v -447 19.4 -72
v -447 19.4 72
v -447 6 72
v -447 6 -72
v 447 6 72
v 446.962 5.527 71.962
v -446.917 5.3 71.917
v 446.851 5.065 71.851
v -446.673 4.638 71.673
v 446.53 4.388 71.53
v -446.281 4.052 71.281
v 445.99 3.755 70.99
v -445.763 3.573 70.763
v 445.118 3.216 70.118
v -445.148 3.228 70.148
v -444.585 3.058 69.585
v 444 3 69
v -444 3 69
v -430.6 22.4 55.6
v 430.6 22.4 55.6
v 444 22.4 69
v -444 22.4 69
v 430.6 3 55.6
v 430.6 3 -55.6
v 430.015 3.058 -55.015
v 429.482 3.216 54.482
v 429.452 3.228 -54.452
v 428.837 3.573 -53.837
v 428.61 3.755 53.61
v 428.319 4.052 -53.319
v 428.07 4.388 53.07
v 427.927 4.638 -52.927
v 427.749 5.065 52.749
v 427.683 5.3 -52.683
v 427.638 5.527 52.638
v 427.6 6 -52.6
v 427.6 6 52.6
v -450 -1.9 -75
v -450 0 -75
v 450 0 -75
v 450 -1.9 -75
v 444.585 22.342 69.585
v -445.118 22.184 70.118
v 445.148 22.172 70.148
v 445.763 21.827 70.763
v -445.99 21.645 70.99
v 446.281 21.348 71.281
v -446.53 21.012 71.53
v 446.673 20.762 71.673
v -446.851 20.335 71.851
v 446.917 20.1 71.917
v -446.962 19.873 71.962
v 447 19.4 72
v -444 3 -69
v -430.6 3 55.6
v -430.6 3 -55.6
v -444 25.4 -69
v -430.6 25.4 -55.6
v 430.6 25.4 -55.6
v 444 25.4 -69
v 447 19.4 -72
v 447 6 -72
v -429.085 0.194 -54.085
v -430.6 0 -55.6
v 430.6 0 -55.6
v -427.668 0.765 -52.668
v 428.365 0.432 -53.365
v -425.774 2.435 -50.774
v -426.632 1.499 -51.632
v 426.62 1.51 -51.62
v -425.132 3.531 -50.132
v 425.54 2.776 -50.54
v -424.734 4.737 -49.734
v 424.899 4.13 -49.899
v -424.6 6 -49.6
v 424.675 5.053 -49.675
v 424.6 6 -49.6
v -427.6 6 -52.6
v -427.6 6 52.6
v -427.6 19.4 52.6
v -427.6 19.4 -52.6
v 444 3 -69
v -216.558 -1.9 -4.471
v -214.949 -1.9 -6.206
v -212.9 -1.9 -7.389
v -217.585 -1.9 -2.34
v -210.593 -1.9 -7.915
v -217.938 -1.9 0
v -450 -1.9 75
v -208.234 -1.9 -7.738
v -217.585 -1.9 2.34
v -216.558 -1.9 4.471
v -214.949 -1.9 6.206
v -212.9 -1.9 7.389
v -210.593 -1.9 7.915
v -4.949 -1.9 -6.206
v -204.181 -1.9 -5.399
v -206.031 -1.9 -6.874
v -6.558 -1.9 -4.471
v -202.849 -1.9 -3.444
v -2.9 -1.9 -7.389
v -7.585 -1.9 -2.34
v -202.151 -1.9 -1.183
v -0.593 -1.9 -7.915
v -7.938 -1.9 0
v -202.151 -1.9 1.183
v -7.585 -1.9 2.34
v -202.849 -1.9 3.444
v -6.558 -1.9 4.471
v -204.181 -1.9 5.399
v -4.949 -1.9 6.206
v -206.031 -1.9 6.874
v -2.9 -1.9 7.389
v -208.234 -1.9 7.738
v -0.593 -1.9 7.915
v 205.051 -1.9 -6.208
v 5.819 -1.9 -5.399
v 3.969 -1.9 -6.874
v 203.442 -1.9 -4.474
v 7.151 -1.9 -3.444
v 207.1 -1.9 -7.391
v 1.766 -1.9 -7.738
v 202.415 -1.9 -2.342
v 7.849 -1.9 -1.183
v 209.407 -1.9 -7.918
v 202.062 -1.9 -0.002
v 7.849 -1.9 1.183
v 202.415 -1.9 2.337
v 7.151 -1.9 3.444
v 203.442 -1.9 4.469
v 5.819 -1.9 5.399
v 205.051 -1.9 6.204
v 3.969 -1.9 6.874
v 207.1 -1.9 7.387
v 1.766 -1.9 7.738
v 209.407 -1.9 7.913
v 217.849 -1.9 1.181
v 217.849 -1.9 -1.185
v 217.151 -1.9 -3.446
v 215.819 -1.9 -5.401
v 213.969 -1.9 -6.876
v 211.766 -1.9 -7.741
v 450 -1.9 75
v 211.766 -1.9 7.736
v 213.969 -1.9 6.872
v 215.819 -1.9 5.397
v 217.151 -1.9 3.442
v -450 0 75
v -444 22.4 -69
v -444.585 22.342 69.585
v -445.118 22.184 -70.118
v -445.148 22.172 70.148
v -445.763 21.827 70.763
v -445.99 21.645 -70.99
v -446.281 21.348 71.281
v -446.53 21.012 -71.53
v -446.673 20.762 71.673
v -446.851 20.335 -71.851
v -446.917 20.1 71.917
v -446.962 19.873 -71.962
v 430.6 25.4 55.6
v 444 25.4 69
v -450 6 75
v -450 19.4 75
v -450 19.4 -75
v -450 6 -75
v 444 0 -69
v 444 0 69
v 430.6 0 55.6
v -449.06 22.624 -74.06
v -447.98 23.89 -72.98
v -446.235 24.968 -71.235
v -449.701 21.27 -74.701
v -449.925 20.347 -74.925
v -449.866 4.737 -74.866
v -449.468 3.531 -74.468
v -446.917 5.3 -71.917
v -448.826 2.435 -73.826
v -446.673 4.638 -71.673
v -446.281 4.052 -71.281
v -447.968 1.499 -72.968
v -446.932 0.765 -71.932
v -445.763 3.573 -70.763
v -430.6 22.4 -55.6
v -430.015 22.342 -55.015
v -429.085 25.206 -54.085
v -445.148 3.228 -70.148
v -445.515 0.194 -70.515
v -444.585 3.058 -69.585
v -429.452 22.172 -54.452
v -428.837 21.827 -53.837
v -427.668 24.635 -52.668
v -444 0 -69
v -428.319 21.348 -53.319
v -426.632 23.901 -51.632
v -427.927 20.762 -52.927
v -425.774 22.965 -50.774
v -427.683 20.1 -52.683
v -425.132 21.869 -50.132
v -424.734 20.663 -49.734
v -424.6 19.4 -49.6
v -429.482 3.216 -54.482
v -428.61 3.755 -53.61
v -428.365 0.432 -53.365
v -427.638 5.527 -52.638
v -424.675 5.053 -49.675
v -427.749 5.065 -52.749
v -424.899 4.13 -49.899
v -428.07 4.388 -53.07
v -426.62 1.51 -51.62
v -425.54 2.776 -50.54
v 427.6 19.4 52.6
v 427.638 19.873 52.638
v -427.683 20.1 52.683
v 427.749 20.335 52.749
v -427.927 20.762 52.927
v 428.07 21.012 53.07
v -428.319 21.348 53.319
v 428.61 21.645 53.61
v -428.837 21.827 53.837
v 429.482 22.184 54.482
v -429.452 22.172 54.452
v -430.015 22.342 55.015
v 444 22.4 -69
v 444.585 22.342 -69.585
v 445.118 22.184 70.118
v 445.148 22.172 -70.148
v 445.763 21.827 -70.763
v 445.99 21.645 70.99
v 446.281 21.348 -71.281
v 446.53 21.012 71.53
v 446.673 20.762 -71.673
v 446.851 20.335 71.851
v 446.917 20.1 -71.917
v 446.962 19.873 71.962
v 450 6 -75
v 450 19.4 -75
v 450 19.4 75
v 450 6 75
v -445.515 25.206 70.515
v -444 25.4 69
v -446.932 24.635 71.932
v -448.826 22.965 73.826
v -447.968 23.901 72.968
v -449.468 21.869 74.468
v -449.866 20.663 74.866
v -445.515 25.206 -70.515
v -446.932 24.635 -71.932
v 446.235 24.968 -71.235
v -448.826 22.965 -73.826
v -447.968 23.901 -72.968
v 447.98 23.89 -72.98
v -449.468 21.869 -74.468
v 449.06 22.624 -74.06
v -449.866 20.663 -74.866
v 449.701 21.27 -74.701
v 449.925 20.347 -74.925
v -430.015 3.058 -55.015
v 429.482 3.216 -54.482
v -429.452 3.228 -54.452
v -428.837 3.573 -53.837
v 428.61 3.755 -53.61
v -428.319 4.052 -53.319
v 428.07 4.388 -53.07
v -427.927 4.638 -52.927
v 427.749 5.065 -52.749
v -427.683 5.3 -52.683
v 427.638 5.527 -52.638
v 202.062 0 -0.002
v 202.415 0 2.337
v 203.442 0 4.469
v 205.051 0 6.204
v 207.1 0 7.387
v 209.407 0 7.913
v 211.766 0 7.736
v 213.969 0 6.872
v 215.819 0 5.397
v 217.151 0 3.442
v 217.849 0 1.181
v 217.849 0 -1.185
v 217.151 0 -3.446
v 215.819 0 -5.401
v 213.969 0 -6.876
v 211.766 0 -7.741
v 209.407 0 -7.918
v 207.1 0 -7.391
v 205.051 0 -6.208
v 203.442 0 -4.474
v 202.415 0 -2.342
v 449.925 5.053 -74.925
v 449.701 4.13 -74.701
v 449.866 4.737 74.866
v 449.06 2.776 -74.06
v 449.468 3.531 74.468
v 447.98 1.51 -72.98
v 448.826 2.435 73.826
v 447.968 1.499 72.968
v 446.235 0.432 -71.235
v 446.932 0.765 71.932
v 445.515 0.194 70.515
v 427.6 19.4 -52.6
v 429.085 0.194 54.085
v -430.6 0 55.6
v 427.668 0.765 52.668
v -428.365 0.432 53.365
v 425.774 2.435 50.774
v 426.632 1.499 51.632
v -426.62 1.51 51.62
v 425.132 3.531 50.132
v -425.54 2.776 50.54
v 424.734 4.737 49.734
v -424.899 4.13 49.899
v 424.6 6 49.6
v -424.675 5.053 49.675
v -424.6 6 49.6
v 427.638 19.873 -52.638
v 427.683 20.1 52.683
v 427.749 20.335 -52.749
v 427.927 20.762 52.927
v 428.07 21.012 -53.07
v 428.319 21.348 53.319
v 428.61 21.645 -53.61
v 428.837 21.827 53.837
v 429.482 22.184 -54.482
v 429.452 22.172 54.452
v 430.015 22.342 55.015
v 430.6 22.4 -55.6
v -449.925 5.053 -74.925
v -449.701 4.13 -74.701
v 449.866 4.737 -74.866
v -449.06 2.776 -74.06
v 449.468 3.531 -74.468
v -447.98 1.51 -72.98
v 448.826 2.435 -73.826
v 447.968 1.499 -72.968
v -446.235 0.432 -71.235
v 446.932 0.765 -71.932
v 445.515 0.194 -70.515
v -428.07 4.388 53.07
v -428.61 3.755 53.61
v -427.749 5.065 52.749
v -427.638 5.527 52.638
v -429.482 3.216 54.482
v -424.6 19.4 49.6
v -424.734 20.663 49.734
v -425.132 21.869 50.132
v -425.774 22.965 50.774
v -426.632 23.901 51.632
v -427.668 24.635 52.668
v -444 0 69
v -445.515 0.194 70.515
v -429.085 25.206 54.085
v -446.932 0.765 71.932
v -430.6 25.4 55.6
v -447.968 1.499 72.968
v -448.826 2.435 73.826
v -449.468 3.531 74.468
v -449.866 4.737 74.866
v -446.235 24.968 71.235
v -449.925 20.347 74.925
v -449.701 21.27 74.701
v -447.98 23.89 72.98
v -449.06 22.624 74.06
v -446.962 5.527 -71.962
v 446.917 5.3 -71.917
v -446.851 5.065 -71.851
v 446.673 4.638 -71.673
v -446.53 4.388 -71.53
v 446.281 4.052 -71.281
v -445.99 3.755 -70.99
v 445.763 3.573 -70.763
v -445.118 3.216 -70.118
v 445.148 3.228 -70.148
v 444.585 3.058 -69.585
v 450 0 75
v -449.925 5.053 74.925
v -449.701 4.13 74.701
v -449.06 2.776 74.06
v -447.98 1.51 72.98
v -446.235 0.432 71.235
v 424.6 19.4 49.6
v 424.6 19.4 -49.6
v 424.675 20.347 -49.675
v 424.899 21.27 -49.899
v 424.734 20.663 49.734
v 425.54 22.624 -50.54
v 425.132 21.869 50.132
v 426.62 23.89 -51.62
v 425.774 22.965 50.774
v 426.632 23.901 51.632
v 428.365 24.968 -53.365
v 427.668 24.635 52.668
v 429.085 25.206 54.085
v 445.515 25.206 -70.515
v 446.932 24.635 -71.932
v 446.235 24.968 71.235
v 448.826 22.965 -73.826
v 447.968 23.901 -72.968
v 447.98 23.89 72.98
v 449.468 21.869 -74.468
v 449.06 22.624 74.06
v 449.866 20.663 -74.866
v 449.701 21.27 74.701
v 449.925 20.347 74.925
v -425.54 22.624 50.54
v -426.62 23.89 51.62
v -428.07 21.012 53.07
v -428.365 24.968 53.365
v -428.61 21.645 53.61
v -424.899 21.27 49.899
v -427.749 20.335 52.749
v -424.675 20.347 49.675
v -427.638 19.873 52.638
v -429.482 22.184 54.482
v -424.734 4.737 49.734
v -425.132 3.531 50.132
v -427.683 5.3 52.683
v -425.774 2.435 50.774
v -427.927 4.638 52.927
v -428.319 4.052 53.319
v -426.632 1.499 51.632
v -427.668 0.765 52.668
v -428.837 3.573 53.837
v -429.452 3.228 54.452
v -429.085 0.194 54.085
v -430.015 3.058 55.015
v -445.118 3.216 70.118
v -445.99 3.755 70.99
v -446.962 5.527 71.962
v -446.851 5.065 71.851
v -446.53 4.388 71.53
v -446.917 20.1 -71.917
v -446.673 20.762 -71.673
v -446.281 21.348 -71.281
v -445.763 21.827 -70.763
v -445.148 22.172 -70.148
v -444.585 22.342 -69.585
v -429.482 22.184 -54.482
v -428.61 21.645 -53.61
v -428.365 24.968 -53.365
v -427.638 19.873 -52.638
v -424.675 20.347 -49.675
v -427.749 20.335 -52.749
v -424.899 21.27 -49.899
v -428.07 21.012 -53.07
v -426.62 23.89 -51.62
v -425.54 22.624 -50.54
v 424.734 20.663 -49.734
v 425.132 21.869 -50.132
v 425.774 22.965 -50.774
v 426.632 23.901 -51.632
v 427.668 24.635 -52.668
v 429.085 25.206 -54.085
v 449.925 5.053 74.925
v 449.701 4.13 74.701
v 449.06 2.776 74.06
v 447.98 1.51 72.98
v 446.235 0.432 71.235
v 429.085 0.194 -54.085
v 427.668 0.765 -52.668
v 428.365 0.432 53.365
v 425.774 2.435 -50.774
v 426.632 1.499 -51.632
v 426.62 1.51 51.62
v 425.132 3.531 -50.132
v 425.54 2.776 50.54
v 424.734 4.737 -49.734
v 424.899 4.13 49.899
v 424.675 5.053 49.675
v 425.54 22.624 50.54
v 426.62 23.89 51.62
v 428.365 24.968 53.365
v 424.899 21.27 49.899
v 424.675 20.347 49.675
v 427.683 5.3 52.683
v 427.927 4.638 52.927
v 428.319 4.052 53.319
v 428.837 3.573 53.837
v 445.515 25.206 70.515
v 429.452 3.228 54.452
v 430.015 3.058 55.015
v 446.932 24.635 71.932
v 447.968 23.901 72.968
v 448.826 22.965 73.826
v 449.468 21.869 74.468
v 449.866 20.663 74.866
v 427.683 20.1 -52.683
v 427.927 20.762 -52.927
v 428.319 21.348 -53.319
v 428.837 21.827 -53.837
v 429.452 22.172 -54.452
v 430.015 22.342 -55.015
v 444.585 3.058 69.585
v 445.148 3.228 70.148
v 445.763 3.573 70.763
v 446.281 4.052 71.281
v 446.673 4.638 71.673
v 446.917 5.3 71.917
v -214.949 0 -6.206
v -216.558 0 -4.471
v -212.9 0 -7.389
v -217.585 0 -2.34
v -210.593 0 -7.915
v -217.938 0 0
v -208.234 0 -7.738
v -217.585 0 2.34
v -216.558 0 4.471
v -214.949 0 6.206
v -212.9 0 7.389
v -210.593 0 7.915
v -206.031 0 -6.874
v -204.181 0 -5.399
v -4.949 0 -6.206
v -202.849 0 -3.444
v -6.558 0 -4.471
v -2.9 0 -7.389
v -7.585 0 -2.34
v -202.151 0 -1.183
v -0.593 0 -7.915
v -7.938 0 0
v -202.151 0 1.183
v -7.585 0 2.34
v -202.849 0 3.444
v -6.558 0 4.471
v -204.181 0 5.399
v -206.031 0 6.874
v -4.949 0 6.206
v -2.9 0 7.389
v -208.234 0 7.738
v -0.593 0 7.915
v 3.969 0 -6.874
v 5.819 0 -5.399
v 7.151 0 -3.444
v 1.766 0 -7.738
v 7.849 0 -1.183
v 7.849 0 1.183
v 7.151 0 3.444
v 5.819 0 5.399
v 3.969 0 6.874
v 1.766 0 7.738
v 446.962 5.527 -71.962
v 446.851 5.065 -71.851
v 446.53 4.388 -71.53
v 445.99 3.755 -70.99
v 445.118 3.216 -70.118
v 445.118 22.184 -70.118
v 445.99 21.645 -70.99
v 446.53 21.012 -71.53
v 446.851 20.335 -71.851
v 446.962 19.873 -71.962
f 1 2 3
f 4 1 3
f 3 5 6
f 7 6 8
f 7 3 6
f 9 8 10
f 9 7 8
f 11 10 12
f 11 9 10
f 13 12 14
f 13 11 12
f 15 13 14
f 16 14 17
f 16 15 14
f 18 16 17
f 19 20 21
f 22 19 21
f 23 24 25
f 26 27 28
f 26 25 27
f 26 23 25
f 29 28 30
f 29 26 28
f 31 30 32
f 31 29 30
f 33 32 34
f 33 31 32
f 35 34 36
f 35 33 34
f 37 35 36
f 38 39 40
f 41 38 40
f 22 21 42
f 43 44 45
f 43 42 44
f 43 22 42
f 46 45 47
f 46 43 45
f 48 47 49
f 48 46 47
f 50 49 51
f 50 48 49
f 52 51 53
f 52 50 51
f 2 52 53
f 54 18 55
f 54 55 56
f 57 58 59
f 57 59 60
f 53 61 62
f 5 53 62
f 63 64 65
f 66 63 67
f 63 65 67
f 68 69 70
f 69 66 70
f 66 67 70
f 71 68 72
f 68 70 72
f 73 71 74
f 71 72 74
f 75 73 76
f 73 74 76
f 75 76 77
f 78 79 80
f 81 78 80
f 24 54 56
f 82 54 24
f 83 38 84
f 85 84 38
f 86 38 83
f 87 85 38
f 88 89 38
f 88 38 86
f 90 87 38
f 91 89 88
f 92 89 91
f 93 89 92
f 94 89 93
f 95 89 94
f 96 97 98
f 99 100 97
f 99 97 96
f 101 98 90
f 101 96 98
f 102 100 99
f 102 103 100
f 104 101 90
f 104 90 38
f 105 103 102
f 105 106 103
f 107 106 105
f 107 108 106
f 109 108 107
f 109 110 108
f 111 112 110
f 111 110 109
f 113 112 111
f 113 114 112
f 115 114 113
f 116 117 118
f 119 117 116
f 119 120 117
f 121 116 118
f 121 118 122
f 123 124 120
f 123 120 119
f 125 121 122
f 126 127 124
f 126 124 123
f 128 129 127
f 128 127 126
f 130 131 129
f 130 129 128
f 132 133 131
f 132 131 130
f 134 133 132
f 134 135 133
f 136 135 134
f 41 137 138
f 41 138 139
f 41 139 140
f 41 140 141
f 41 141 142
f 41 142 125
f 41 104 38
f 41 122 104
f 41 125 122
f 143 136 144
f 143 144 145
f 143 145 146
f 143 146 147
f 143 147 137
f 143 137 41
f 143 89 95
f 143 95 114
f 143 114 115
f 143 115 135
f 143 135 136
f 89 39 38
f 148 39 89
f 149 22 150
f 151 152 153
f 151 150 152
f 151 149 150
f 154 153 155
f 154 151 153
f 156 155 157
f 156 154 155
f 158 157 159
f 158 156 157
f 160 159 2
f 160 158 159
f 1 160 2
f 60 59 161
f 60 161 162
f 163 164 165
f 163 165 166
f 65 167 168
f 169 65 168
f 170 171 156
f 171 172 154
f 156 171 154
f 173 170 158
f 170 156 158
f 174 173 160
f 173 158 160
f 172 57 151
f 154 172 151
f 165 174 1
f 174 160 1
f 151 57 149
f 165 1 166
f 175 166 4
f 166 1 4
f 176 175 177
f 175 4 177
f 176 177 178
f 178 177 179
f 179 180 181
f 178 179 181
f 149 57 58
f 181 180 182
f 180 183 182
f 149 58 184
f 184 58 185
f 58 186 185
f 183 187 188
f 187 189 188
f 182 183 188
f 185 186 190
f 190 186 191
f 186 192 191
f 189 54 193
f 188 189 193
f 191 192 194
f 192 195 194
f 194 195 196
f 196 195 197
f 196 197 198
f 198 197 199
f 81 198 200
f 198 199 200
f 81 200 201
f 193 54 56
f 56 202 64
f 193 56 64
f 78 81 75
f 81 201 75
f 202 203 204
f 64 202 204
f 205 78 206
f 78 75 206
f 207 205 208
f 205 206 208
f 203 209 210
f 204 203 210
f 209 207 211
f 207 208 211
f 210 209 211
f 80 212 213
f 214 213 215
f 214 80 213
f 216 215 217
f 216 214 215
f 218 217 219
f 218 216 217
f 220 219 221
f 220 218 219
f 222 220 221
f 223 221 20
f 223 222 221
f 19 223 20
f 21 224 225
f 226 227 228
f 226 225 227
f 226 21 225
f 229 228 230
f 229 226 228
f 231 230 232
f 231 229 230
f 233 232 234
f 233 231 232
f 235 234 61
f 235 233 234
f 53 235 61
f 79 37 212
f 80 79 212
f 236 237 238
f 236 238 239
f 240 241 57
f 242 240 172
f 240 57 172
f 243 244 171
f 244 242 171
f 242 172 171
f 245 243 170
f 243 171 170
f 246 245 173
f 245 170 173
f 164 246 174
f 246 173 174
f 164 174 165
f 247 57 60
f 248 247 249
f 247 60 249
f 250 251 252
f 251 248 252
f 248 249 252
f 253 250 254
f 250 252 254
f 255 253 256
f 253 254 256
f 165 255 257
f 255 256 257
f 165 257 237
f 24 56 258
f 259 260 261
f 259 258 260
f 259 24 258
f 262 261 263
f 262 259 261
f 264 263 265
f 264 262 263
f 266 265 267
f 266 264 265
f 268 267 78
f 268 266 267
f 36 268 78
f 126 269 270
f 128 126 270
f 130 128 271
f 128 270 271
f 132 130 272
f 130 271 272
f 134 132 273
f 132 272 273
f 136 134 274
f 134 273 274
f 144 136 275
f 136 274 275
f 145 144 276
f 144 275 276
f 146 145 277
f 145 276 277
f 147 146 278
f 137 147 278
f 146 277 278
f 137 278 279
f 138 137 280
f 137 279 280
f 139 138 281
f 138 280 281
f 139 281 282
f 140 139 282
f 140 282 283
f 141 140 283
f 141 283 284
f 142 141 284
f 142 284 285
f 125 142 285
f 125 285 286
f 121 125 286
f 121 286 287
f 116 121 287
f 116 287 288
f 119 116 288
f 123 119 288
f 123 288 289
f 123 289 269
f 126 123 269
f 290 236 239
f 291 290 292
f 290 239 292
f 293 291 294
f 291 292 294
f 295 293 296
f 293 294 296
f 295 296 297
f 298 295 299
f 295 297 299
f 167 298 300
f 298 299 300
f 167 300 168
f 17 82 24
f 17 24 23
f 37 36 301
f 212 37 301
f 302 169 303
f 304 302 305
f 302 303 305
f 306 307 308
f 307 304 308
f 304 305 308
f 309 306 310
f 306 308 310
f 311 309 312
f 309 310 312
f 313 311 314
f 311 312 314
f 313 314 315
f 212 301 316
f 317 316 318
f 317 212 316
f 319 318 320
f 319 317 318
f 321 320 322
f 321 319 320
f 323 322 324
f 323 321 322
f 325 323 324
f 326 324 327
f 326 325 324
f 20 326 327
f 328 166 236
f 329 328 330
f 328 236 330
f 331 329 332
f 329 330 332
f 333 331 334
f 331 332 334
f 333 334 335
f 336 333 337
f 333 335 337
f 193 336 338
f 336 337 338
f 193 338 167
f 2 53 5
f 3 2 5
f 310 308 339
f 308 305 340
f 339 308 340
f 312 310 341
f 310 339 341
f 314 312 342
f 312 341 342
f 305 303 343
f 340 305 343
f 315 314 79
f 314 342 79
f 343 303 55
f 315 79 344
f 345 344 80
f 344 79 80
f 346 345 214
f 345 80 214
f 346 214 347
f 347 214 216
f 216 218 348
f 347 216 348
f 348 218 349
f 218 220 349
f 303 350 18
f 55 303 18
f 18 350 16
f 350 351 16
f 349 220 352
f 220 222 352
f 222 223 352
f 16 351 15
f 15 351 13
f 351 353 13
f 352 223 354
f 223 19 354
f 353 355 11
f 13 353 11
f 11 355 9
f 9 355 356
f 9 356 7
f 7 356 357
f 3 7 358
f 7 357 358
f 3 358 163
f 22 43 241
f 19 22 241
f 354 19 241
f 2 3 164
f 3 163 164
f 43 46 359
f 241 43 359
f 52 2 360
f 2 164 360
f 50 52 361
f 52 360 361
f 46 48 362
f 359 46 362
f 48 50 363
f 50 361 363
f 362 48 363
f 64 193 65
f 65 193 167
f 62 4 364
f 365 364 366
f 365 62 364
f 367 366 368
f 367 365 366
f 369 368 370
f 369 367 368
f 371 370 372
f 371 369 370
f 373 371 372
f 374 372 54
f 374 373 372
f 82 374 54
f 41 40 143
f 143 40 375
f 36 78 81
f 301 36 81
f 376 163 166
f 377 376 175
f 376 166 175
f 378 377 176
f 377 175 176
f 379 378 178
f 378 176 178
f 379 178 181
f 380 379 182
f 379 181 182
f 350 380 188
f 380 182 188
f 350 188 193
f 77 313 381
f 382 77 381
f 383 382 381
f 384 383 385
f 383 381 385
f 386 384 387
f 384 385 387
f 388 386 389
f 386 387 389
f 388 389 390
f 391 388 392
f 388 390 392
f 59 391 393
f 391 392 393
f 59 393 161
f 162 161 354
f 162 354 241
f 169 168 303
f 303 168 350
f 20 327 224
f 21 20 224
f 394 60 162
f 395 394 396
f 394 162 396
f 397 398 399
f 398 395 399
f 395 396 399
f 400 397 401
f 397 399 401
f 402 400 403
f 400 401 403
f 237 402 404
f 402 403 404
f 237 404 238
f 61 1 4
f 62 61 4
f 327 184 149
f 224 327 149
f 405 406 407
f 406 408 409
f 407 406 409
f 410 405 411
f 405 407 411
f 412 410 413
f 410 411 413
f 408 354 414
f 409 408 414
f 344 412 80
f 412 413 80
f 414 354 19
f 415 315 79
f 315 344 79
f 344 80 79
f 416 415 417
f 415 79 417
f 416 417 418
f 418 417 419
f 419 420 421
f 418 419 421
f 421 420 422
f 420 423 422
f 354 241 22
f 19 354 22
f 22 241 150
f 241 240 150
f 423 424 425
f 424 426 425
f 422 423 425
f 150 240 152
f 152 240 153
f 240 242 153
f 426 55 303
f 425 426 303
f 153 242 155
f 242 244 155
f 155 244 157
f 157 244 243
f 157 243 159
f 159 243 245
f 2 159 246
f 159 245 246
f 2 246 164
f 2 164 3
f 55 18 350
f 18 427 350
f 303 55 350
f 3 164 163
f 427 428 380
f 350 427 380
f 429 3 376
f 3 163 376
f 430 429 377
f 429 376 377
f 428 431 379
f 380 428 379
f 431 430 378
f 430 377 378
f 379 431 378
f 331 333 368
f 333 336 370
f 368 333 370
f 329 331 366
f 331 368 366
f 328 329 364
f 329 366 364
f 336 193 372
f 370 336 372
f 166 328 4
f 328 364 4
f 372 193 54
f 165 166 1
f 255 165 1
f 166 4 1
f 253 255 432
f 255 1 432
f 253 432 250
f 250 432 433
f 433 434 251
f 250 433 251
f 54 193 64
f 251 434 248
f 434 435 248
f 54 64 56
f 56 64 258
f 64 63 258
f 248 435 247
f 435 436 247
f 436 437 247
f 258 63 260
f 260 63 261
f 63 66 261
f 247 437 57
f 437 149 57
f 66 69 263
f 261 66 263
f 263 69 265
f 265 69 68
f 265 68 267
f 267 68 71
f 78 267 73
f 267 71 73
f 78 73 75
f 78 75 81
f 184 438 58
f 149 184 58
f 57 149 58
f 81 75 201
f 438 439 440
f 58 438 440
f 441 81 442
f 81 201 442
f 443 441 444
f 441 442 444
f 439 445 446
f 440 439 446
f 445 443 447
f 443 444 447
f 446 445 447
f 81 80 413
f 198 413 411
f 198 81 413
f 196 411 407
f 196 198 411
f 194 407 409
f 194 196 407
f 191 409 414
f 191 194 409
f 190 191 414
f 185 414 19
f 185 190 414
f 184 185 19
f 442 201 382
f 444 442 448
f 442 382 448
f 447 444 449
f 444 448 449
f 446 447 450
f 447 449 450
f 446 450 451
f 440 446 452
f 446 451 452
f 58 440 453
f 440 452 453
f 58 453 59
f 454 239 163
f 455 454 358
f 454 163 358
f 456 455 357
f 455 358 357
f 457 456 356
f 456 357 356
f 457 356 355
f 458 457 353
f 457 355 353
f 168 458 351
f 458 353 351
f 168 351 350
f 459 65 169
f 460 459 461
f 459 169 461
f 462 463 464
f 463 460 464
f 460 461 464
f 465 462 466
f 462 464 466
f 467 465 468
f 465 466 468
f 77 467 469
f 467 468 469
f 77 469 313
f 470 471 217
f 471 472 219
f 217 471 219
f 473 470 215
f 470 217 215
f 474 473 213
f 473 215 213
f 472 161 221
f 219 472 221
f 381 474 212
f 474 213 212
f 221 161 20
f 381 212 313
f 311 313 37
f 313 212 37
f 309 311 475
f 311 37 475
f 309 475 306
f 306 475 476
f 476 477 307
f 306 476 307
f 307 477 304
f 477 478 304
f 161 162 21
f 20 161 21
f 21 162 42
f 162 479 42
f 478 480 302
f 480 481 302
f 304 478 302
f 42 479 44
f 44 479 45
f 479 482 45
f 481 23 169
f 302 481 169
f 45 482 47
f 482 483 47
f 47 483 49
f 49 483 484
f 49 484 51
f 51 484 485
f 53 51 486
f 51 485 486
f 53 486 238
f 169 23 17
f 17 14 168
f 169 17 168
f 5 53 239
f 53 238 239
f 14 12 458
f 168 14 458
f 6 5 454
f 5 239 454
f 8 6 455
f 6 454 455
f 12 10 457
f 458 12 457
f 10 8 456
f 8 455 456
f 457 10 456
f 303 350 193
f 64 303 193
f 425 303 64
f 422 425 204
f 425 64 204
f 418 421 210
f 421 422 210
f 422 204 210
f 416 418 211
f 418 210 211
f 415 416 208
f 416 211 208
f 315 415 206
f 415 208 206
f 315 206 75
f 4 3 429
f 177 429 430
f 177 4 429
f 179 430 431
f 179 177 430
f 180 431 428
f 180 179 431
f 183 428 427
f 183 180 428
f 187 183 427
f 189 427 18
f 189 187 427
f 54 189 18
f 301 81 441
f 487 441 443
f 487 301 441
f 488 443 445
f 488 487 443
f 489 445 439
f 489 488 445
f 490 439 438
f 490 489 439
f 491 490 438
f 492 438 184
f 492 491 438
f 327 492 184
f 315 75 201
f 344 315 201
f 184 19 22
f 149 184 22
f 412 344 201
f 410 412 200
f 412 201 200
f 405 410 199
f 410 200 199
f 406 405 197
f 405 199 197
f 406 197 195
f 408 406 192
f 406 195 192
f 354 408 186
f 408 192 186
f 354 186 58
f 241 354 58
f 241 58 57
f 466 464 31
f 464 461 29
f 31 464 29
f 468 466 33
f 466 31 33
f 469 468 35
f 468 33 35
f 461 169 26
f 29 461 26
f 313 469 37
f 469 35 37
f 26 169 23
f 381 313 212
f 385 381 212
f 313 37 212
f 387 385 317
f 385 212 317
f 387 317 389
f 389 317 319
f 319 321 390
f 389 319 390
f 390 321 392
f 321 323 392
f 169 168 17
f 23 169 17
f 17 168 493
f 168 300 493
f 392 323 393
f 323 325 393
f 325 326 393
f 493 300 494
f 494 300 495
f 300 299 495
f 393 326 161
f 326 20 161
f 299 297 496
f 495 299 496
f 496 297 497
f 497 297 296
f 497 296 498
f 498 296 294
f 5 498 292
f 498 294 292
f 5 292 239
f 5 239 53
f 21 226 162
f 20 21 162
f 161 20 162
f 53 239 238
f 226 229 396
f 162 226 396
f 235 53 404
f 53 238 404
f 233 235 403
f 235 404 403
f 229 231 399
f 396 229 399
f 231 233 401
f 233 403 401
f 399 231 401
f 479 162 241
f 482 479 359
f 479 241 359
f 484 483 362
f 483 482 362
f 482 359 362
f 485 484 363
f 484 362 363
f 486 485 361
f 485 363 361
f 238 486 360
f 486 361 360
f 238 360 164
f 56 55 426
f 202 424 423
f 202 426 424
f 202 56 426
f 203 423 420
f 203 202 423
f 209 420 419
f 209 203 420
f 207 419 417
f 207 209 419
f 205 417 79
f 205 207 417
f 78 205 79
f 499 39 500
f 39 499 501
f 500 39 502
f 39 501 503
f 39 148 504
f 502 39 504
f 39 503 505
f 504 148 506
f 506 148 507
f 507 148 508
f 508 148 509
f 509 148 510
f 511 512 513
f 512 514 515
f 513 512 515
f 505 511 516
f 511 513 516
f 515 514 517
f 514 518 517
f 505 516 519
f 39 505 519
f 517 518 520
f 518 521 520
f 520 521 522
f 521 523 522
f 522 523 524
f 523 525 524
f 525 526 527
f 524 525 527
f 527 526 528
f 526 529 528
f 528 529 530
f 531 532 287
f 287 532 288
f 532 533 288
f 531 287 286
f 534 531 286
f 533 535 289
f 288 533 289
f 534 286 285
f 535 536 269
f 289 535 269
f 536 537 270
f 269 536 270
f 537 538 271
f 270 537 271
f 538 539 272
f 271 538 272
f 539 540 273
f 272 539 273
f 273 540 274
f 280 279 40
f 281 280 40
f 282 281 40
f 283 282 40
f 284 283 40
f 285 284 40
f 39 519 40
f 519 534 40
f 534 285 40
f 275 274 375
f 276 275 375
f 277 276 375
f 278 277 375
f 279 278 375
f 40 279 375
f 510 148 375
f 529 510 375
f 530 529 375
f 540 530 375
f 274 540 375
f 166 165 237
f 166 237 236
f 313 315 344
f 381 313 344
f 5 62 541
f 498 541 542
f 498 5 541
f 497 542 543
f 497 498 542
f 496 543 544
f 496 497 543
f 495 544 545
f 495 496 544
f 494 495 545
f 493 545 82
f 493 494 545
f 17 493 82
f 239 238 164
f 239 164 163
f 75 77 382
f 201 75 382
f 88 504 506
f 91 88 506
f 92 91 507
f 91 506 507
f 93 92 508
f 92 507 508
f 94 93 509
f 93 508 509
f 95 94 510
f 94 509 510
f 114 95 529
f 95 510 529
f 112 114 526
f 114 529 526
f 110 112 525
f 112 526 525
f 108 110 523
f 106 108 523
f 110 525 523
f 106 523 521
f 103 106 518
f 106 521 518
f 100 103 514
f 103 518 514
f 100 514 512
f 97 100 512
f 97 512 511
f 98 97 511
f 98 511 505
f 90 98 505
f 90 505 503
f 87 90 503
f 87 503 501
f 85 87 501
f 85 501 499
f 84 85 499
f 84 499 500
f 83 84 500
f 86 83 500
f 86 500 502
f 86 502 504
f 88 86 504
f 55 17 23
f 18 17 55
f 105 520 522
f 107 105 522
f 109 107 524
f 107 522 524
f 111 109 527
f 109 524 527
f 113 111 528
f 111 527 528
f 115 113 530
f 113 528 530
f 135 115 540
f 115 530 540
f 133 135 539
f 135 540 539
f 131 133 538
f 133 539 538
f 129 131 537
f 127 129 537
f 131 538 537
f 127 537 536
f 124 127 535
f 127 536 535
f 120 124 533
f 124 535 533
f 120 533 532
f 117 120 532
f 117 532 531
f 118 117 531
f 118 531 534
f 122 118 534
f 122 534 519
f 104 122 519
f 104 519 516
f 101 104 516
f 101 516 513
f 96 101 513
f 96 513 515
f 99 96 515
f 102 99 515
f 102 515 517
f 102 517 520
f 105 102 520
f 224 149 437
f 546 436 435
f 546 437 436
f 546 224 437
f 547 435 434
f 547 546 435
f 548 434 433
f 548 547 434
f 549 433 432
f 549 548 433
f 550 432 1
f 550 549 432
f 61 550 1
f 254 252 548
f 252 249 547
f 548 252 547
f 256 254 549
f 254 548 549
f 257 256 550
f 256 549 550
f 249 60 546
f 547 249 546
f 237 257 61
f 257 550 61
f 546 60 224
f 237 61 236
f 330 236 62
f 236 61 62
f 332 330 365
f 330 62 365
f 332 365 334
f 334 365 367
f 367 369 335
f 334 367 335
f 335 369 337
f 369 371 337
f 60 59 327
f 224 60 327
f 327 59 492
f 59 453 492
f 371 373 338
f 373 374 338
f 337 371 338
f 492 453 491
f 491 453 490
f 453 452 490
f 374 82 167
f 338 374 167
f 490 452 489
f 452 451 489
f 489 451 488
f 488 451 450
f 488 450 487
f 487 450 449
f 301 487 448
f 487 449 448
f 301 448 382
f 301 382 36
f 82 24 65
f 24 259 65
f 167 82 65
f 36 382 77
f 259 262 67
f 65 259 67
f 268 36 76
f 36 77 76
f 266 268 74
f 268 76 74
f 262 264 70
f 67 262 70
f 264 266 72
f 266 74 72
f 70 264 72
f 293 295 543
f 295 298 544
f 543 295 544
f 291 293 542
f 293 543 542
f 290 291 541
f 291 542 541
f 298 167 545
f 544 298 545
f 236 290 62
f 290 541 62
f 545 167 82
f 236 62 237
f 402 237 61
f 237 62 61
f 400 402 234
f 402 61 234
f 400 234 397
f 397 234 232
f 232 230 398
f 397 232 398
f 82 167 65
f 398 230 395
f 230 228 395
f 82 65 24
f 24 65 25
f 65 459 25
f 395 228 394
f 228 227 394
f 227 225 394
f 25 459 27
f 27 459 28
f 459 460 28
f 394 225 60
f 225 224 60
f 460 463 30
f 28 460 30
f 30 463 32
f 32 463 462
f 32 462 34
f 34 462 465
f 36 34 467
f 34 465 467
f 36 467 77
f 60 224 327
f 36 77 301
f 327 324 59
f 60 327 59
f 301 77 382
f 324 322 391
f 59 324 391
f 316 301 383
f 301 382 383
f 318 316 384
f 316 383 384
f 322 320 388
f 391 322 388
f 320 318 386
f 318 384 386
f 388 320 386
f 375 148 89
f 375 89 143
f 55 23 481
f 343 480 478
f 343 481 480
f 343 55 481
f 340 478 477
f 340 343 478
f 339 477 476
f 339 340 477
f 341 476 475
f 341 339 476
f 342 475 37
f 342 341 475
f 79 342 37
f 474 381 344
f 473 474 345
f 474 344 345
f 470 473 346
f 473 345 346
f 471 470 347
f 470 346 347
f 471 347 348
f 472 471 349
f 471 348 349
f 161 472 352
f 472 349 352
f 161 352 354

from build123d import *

# Parameters (mm, degrees)
TUBO_CUADRADO_2_X_2_X_0_25_1_DEPTH      = 186.921024484
TUBO_CUADRADO_2_X_2_X_0_25_1_DEPTH_BACK = 36.921024484
TUBO_CUADRADO_2_X_2_X_0_25_1_2_DEPTH    = 973.842048969
TUBO_CUADRADO_2_X_2_X_0_25_1_3_DEPTH    = 223.842048969
TUBO_CUADRADO_2_X_2_X_0_25_1_4_DEPTH    = 973.842048969
CROQUIS3_W                              = 900
CROQUIS3_H                              = 150
SALIENTE_EXTRUIR1_DEPTH                 = 1.9
CROQUIS4_R                              = 7.937500001
CORTAR_EXTRUIR1_DEPTH                   = 10


with BuildPart() as part:
    # Sketch1 → Tubo cuadrado 2 X 2 X 0.25(1) (new, two sides: drawn at the far end of the back side and taken through both)
    with BuildSketch(Plane(origin=(-437.3, 12.7, -75), x_dir=(1, 0, 0), z_dir=(0, 0, 1)).offset(-TUBO_CUADRADO_2_X_2_X_0_25_1_DEPTH_BACK)):
        with BuildLine():
            Line((-6.7, -12.7), (6.7, -12.7))
            ThreePointArc((6.7, -12.7), (10.942640687, -10.942640687), (12.7, -6.7))
            Line((12.7, -6.7), (12.7, 6.7))
            ThreePointArc((12.7, 6.7), (10.942640687, 10.942640687), (6.7, 12.7))
            Line((6.7, 12.7), (-6.7, 12.7))
            ThreePointArc((-6.7, 12.7), (-10.942640687, 10.942640687), (-12.7, 6.7))
            Line((-12.7, 6.7), (-12.7, -6.7))
            ThreePointArc((-12.7, -6.7), (-10.942640687, -10.942640687), (-6.7, -12.7))
        make_face()
        with BuildLine():
            Line((-6.7, -9.7), (6.7, -9.7))
            ThreePointArc((6.7, -9.7), (8.821320344, -8.821320344), (9.7, -6.7))
            Line((9.7, -6.7), (9.7, 6.7))
            ThreePointArc((9.7, 6.7), (8.821320344, 8.821320344), (6.7, 9.7))
            Line((6.7, 9.7), (-6.7, 9.7))
            ThreePointArc((-6.7, 9.7), (-8.821320344, 8.821320344), (-9.7, 6.7))
            Line((-9.7, 6.7), (-9.7, -6.7))
            ThreePointArc((-9.7, -6.7), (-8.821320344, -8.821320344), (-6.7, -9.7))
        make_face(mode=Mode.SUBTRACT)
    extrude(amount=TUBO_CUADRADO_2_X_2_X_0_25_1_DEPTH + TUBO_CUADRADO_2_X_2_X_0_25_1_DEPTH_BACK)

    # Tubo cuadrado 2 X 2 X 0.25(1) mitre 1
    split(bisect_by=Plane(origin=(-450, 0, -75), x_dir=(0, -1, 0), z_dir=(-0.707106781, 0, 0.707106781)), keep=Keep.TOP)

    # Tubo cuadrado 2 X 2 X 0.25(1) mitre 2
    split(bisect_by=Plane(origin=(-450, 0, 75), x_dir=(0, -1, 0), z_dir=(-0.707106781, 0, -0.707106781)), keep=Keep.TOP)


with BuildPart() as body_2:
    # Sketch1 on segment 2 (carried to segment 2) → Tubo cuadrado 2 X 2 X 0.25_1 2 (new body)
    with BuildSketch(Plane(origin=(-486.921024484, 12.7, 62.3), x_dir=(0, 0, -1), z_dir=(1, 0, 0))):
        with BuildLine():
            Line((-6.7, -12.7), (6.7, -12.7))
            ThreePointArc((6.7, -12.7), (10.942640687, -10.942640687), (12.7, -6.7))
            Line((12.7, -6.7), (12.7, 6.7))
            ThreePointArc((12.7, 6.7), (10.942640687, 10.942640687), (6.7, 12.7))
            Line((6.7, 12.7), (-6.7, 12.7))
            ThreePointArc((-6.7, 12.7), (-10.942640687, 10.942640687), (-12.7, 6.7))
            Line((-12.7, 6.7), (-12.7, -6.7))
            ThreePointArc((-12.7, -6.7), (-10.942640687, -10.942640687), (-6.7, -12.7))
        make_face()
        with BuildLine():
            Line((-6.7, -9.7), (6.7, -9.7))
            ThreePointArc((6.7, -9.7), (8.821320344, -8.821320344), (9.7, -6.7))
            Line((9.7, -6.7), (9.7, 6.7))
            ThreePointArc((9.7, 6.7), (8.821320344, 8.821320344), (6.7, 9.7))
            Line((6.7, 9.7), (-6.7, 9.7))
            ThreePointArc((-6.7, 9.7), (-8.821320344, 8.821320344), (-9.7, 6.7))
            Line((-9.7, 6.7), (-9.7, -6.7))
            ThreePointArc((-9.7, -6.7), (-8.821320344, -8.821320344), (-6.7, -9.7))
        make_face(mode=Mode.SUBTRACT)
    extrude(amount=TUBO_CUADRADO_2_X_2_X_0_25_1_2_DEPTH)

    # Tubo cuadrado 2 X 2 X 0.25_1 2 mitre 1
    split(bisect_by=Plane(origin=(-450, 0, 75), x_dir=(0, 1, 0), z_dir=(0.707106781, 0, 0.707106781)), keep=Keep.TOP)

    # Tubo cuadrado 2 X 2 X 0.25_1 2 mitre 2
    split(bisect_by=Plane(origin=(450, 0, 75), x_dir=(0, -1, 0), z_dir=(-0.707106781, 0, 0.707106781)), keep=Keep.TOP)


with BuildPart() as body_3:
    # Sketch1 on segment 3 (carried to segment 3) → Tubo cuadrado 2 X 2 X 0.25_1 3 (new body)
    with BuildSketch(Plane(origin=(437.3, 12.7, 111.921024484), x_dir=(-1, 0, 0), z_dir=(0, 0, -1))):
        with BuildLine():
            Line((-6.7, -12.7), (6.7, -12.7))
            ThreePointArc((6.7, -12.7), (10.942640687, -10.942640687), (12.7, -6.7))
            Line((12.7, -6.7), (12.7, 6.7))
            ThreePointArc((12.7, 6.7), (10.942640687, 10.942640687), (6.7, 12.7))
            Line((6.7, 12.7), (-6.7, 12.7))
            ThreePointArc((-6.7, 12.7), (-10.942640687, 10.942640687), (-12.7, 6.7))
            Line((-12.7, 6.7), (-12.7, -6.7))
            ThreePointArc((-12.7, -6.7), (-10.942640687, -10.942640687), (-6.7, -12.7))
        make_face()
        with BuildLine():
            Line((-6.7, -9.7), (6.7, -9.7))
            ThreePointArc((6.7, -9.7), (8.821320344, -8.821320344), (9.7, -6.7))
            Line((9.7, -6.7), (9.7, 6.7))
            ThreePointArc((9.7, 6.7), (8.821320344, 8.821320344), (6.7, 9.7))
            Line((6.7, 9.7), (-6.7, 9.7))
            ThreePointArc((-6.7, 9.7), (-8.821320344, 8.821320344), (-9.7, 6.7))
            Line((-9.7, 6.7), (-9.7, -6.7))
            ThreePointArc((-9.7, -6.7), (-8.821320344, -8.821320344), (-6.7, -9.7))
        make_face(mode=Mode.SUBTRACT)
    extrude(amount=TUBO_CUADRADO_2_X_2_X_0_25_1_3_DEPTH)

    # Tubo cuadrado 2 X 2 X 0.25_1 3 mitre 1
    split(bisect_by=Plane(origin=(450, 0, -75), x_dir=(0, 1, 0), z_dir=(0.707106781, 0, 0.707106781)), keep=Keep.TOP)

    # Tubo cuadrado 2 X 2 X 0.25_1 3 mitre 2
    split(bisect_by=Plane(origin=(450, 0, 75), x_dir=(0, 1, 0), z_dir=(0.707106781, 0, -0.707106781)), keep=Keep.TOP)


with BuildPart() as body_4:
    # Sketch1 on segment 4 (carried to segment 4) → Tubo cuadrado 2 X 2 X 0.25_1 4 (new body)
    with BuildSketch(Plane(origin=(486.921024484, 12.7, -62.3), x_dir=(0, 0, 1), z_dir=(-1, 0, 0))):
        with BuildLine():
            Line((-6.7, -12.7), (6.7, -12.7))
            ThreePointArc((6.7, -12.7), (10.942640687, -10.942640687), (12.7, -6.7))
            Line((12.7, -6.7), (12.7, 6.7))
            ThreePointArc((12.7, 6.7), (10.942640687, 10.942640687), (6.7, 12.7))
            Line((6.7, 12.7), (-6.7, 12.7))
            ThreePointArc((-6.7, 12.7), (-10.942640687, 10.942640687), (-12.7, 6.7))
            Line((-12.7, 6.7), (-12.7, -6.7))
            ThreePointArc((-12.7, -6.7), (-10.942640687, -10.942640687), (-6.7, -12.7))
        make_face()
        with BuildLine():
            Line((-6.7, -9.7), (6.7, -9.7))
            ThreePointArc((6.7, -9.7), (8.821320344, -8.821320344), (9.7, -6.7))
            Line((9.7, -6.7), (9.7, 6.7))
            ThreePointArc((9.7, 6.7), (8.821320344, 8.821320344), (6.7, 9.7))
            Line((6.7, 9.7), (-6.7, 9.7))
            ThreePointArc((-6.7, 9.7), (-8.821320344, 8.821320344), (-9.7, 6.7))
            Line((-9.7, 6.7), (-9.7, -6.7))
            ThreePointArc((-9.7, -6.7), (-8.821320344, -8.821320344), (-6.7, -9.7))
        make_face(mode=Mode.SUBTRACT)
    extrude(amount=TUBO_CUADRADO_2_X_2_X_0_25_1_4_DEPTH)

    # Tubo cuadrado 2 X 2 X 0.25_1 4 mitre 1
    split(bisect_by=Plane(origin=(-450, 0, -75), x_dir=(0, 1, 0), z_dir=(0.707106781, 0, -0.707106781)), keep=Keep.TOP)

    # Tubo cuadrado 2 X 2 X 0.25_1 4 mitre 2
    split(bisect_by=Plane(origin=(450, 0, -75), x_dir=(0, -1, 0), z_dir=(-0.707106781, 0, -0.707106781)), keep=Keep.TOP)


with BuildPart() as body_5:
    # Croquis3 → Saliente-Extruir1 (new body)
    with BuildSketch(Plane.XZ):
        Rectangle(CROQUIS3_W, CROQUIS3_H)
    extrude(amount=SALIENTE_EXTRUIR1_DEPTH)

    # Croquis4 → Cortar-Extruir1 (cut)
    with BuildSketch(Plane(origin=(0, 0, 0), x_dir=(1, 0, 0), z_dir=(0, 1, 0))):
        with Locations(Location((-210, 0, 0), (0, 0, 180))):
            Circle(CROQUIS4_R)
        with Locations(Location((0, 0, 0), (0, 0, 180))):
            Circle(CROQUIS4_R)
        with Locations(Location((210, 0.002204666, 0), (0, 0, 180))):
            Circle(CROQUIS4_R)
    extrude(amount=-CORTAR_EXTRUIR1_DEPTH, mode=Mode.SUBTRACT)


solid = Compound([part.part, body_2.part, body_3.part, body_4.part, body_5.part])
